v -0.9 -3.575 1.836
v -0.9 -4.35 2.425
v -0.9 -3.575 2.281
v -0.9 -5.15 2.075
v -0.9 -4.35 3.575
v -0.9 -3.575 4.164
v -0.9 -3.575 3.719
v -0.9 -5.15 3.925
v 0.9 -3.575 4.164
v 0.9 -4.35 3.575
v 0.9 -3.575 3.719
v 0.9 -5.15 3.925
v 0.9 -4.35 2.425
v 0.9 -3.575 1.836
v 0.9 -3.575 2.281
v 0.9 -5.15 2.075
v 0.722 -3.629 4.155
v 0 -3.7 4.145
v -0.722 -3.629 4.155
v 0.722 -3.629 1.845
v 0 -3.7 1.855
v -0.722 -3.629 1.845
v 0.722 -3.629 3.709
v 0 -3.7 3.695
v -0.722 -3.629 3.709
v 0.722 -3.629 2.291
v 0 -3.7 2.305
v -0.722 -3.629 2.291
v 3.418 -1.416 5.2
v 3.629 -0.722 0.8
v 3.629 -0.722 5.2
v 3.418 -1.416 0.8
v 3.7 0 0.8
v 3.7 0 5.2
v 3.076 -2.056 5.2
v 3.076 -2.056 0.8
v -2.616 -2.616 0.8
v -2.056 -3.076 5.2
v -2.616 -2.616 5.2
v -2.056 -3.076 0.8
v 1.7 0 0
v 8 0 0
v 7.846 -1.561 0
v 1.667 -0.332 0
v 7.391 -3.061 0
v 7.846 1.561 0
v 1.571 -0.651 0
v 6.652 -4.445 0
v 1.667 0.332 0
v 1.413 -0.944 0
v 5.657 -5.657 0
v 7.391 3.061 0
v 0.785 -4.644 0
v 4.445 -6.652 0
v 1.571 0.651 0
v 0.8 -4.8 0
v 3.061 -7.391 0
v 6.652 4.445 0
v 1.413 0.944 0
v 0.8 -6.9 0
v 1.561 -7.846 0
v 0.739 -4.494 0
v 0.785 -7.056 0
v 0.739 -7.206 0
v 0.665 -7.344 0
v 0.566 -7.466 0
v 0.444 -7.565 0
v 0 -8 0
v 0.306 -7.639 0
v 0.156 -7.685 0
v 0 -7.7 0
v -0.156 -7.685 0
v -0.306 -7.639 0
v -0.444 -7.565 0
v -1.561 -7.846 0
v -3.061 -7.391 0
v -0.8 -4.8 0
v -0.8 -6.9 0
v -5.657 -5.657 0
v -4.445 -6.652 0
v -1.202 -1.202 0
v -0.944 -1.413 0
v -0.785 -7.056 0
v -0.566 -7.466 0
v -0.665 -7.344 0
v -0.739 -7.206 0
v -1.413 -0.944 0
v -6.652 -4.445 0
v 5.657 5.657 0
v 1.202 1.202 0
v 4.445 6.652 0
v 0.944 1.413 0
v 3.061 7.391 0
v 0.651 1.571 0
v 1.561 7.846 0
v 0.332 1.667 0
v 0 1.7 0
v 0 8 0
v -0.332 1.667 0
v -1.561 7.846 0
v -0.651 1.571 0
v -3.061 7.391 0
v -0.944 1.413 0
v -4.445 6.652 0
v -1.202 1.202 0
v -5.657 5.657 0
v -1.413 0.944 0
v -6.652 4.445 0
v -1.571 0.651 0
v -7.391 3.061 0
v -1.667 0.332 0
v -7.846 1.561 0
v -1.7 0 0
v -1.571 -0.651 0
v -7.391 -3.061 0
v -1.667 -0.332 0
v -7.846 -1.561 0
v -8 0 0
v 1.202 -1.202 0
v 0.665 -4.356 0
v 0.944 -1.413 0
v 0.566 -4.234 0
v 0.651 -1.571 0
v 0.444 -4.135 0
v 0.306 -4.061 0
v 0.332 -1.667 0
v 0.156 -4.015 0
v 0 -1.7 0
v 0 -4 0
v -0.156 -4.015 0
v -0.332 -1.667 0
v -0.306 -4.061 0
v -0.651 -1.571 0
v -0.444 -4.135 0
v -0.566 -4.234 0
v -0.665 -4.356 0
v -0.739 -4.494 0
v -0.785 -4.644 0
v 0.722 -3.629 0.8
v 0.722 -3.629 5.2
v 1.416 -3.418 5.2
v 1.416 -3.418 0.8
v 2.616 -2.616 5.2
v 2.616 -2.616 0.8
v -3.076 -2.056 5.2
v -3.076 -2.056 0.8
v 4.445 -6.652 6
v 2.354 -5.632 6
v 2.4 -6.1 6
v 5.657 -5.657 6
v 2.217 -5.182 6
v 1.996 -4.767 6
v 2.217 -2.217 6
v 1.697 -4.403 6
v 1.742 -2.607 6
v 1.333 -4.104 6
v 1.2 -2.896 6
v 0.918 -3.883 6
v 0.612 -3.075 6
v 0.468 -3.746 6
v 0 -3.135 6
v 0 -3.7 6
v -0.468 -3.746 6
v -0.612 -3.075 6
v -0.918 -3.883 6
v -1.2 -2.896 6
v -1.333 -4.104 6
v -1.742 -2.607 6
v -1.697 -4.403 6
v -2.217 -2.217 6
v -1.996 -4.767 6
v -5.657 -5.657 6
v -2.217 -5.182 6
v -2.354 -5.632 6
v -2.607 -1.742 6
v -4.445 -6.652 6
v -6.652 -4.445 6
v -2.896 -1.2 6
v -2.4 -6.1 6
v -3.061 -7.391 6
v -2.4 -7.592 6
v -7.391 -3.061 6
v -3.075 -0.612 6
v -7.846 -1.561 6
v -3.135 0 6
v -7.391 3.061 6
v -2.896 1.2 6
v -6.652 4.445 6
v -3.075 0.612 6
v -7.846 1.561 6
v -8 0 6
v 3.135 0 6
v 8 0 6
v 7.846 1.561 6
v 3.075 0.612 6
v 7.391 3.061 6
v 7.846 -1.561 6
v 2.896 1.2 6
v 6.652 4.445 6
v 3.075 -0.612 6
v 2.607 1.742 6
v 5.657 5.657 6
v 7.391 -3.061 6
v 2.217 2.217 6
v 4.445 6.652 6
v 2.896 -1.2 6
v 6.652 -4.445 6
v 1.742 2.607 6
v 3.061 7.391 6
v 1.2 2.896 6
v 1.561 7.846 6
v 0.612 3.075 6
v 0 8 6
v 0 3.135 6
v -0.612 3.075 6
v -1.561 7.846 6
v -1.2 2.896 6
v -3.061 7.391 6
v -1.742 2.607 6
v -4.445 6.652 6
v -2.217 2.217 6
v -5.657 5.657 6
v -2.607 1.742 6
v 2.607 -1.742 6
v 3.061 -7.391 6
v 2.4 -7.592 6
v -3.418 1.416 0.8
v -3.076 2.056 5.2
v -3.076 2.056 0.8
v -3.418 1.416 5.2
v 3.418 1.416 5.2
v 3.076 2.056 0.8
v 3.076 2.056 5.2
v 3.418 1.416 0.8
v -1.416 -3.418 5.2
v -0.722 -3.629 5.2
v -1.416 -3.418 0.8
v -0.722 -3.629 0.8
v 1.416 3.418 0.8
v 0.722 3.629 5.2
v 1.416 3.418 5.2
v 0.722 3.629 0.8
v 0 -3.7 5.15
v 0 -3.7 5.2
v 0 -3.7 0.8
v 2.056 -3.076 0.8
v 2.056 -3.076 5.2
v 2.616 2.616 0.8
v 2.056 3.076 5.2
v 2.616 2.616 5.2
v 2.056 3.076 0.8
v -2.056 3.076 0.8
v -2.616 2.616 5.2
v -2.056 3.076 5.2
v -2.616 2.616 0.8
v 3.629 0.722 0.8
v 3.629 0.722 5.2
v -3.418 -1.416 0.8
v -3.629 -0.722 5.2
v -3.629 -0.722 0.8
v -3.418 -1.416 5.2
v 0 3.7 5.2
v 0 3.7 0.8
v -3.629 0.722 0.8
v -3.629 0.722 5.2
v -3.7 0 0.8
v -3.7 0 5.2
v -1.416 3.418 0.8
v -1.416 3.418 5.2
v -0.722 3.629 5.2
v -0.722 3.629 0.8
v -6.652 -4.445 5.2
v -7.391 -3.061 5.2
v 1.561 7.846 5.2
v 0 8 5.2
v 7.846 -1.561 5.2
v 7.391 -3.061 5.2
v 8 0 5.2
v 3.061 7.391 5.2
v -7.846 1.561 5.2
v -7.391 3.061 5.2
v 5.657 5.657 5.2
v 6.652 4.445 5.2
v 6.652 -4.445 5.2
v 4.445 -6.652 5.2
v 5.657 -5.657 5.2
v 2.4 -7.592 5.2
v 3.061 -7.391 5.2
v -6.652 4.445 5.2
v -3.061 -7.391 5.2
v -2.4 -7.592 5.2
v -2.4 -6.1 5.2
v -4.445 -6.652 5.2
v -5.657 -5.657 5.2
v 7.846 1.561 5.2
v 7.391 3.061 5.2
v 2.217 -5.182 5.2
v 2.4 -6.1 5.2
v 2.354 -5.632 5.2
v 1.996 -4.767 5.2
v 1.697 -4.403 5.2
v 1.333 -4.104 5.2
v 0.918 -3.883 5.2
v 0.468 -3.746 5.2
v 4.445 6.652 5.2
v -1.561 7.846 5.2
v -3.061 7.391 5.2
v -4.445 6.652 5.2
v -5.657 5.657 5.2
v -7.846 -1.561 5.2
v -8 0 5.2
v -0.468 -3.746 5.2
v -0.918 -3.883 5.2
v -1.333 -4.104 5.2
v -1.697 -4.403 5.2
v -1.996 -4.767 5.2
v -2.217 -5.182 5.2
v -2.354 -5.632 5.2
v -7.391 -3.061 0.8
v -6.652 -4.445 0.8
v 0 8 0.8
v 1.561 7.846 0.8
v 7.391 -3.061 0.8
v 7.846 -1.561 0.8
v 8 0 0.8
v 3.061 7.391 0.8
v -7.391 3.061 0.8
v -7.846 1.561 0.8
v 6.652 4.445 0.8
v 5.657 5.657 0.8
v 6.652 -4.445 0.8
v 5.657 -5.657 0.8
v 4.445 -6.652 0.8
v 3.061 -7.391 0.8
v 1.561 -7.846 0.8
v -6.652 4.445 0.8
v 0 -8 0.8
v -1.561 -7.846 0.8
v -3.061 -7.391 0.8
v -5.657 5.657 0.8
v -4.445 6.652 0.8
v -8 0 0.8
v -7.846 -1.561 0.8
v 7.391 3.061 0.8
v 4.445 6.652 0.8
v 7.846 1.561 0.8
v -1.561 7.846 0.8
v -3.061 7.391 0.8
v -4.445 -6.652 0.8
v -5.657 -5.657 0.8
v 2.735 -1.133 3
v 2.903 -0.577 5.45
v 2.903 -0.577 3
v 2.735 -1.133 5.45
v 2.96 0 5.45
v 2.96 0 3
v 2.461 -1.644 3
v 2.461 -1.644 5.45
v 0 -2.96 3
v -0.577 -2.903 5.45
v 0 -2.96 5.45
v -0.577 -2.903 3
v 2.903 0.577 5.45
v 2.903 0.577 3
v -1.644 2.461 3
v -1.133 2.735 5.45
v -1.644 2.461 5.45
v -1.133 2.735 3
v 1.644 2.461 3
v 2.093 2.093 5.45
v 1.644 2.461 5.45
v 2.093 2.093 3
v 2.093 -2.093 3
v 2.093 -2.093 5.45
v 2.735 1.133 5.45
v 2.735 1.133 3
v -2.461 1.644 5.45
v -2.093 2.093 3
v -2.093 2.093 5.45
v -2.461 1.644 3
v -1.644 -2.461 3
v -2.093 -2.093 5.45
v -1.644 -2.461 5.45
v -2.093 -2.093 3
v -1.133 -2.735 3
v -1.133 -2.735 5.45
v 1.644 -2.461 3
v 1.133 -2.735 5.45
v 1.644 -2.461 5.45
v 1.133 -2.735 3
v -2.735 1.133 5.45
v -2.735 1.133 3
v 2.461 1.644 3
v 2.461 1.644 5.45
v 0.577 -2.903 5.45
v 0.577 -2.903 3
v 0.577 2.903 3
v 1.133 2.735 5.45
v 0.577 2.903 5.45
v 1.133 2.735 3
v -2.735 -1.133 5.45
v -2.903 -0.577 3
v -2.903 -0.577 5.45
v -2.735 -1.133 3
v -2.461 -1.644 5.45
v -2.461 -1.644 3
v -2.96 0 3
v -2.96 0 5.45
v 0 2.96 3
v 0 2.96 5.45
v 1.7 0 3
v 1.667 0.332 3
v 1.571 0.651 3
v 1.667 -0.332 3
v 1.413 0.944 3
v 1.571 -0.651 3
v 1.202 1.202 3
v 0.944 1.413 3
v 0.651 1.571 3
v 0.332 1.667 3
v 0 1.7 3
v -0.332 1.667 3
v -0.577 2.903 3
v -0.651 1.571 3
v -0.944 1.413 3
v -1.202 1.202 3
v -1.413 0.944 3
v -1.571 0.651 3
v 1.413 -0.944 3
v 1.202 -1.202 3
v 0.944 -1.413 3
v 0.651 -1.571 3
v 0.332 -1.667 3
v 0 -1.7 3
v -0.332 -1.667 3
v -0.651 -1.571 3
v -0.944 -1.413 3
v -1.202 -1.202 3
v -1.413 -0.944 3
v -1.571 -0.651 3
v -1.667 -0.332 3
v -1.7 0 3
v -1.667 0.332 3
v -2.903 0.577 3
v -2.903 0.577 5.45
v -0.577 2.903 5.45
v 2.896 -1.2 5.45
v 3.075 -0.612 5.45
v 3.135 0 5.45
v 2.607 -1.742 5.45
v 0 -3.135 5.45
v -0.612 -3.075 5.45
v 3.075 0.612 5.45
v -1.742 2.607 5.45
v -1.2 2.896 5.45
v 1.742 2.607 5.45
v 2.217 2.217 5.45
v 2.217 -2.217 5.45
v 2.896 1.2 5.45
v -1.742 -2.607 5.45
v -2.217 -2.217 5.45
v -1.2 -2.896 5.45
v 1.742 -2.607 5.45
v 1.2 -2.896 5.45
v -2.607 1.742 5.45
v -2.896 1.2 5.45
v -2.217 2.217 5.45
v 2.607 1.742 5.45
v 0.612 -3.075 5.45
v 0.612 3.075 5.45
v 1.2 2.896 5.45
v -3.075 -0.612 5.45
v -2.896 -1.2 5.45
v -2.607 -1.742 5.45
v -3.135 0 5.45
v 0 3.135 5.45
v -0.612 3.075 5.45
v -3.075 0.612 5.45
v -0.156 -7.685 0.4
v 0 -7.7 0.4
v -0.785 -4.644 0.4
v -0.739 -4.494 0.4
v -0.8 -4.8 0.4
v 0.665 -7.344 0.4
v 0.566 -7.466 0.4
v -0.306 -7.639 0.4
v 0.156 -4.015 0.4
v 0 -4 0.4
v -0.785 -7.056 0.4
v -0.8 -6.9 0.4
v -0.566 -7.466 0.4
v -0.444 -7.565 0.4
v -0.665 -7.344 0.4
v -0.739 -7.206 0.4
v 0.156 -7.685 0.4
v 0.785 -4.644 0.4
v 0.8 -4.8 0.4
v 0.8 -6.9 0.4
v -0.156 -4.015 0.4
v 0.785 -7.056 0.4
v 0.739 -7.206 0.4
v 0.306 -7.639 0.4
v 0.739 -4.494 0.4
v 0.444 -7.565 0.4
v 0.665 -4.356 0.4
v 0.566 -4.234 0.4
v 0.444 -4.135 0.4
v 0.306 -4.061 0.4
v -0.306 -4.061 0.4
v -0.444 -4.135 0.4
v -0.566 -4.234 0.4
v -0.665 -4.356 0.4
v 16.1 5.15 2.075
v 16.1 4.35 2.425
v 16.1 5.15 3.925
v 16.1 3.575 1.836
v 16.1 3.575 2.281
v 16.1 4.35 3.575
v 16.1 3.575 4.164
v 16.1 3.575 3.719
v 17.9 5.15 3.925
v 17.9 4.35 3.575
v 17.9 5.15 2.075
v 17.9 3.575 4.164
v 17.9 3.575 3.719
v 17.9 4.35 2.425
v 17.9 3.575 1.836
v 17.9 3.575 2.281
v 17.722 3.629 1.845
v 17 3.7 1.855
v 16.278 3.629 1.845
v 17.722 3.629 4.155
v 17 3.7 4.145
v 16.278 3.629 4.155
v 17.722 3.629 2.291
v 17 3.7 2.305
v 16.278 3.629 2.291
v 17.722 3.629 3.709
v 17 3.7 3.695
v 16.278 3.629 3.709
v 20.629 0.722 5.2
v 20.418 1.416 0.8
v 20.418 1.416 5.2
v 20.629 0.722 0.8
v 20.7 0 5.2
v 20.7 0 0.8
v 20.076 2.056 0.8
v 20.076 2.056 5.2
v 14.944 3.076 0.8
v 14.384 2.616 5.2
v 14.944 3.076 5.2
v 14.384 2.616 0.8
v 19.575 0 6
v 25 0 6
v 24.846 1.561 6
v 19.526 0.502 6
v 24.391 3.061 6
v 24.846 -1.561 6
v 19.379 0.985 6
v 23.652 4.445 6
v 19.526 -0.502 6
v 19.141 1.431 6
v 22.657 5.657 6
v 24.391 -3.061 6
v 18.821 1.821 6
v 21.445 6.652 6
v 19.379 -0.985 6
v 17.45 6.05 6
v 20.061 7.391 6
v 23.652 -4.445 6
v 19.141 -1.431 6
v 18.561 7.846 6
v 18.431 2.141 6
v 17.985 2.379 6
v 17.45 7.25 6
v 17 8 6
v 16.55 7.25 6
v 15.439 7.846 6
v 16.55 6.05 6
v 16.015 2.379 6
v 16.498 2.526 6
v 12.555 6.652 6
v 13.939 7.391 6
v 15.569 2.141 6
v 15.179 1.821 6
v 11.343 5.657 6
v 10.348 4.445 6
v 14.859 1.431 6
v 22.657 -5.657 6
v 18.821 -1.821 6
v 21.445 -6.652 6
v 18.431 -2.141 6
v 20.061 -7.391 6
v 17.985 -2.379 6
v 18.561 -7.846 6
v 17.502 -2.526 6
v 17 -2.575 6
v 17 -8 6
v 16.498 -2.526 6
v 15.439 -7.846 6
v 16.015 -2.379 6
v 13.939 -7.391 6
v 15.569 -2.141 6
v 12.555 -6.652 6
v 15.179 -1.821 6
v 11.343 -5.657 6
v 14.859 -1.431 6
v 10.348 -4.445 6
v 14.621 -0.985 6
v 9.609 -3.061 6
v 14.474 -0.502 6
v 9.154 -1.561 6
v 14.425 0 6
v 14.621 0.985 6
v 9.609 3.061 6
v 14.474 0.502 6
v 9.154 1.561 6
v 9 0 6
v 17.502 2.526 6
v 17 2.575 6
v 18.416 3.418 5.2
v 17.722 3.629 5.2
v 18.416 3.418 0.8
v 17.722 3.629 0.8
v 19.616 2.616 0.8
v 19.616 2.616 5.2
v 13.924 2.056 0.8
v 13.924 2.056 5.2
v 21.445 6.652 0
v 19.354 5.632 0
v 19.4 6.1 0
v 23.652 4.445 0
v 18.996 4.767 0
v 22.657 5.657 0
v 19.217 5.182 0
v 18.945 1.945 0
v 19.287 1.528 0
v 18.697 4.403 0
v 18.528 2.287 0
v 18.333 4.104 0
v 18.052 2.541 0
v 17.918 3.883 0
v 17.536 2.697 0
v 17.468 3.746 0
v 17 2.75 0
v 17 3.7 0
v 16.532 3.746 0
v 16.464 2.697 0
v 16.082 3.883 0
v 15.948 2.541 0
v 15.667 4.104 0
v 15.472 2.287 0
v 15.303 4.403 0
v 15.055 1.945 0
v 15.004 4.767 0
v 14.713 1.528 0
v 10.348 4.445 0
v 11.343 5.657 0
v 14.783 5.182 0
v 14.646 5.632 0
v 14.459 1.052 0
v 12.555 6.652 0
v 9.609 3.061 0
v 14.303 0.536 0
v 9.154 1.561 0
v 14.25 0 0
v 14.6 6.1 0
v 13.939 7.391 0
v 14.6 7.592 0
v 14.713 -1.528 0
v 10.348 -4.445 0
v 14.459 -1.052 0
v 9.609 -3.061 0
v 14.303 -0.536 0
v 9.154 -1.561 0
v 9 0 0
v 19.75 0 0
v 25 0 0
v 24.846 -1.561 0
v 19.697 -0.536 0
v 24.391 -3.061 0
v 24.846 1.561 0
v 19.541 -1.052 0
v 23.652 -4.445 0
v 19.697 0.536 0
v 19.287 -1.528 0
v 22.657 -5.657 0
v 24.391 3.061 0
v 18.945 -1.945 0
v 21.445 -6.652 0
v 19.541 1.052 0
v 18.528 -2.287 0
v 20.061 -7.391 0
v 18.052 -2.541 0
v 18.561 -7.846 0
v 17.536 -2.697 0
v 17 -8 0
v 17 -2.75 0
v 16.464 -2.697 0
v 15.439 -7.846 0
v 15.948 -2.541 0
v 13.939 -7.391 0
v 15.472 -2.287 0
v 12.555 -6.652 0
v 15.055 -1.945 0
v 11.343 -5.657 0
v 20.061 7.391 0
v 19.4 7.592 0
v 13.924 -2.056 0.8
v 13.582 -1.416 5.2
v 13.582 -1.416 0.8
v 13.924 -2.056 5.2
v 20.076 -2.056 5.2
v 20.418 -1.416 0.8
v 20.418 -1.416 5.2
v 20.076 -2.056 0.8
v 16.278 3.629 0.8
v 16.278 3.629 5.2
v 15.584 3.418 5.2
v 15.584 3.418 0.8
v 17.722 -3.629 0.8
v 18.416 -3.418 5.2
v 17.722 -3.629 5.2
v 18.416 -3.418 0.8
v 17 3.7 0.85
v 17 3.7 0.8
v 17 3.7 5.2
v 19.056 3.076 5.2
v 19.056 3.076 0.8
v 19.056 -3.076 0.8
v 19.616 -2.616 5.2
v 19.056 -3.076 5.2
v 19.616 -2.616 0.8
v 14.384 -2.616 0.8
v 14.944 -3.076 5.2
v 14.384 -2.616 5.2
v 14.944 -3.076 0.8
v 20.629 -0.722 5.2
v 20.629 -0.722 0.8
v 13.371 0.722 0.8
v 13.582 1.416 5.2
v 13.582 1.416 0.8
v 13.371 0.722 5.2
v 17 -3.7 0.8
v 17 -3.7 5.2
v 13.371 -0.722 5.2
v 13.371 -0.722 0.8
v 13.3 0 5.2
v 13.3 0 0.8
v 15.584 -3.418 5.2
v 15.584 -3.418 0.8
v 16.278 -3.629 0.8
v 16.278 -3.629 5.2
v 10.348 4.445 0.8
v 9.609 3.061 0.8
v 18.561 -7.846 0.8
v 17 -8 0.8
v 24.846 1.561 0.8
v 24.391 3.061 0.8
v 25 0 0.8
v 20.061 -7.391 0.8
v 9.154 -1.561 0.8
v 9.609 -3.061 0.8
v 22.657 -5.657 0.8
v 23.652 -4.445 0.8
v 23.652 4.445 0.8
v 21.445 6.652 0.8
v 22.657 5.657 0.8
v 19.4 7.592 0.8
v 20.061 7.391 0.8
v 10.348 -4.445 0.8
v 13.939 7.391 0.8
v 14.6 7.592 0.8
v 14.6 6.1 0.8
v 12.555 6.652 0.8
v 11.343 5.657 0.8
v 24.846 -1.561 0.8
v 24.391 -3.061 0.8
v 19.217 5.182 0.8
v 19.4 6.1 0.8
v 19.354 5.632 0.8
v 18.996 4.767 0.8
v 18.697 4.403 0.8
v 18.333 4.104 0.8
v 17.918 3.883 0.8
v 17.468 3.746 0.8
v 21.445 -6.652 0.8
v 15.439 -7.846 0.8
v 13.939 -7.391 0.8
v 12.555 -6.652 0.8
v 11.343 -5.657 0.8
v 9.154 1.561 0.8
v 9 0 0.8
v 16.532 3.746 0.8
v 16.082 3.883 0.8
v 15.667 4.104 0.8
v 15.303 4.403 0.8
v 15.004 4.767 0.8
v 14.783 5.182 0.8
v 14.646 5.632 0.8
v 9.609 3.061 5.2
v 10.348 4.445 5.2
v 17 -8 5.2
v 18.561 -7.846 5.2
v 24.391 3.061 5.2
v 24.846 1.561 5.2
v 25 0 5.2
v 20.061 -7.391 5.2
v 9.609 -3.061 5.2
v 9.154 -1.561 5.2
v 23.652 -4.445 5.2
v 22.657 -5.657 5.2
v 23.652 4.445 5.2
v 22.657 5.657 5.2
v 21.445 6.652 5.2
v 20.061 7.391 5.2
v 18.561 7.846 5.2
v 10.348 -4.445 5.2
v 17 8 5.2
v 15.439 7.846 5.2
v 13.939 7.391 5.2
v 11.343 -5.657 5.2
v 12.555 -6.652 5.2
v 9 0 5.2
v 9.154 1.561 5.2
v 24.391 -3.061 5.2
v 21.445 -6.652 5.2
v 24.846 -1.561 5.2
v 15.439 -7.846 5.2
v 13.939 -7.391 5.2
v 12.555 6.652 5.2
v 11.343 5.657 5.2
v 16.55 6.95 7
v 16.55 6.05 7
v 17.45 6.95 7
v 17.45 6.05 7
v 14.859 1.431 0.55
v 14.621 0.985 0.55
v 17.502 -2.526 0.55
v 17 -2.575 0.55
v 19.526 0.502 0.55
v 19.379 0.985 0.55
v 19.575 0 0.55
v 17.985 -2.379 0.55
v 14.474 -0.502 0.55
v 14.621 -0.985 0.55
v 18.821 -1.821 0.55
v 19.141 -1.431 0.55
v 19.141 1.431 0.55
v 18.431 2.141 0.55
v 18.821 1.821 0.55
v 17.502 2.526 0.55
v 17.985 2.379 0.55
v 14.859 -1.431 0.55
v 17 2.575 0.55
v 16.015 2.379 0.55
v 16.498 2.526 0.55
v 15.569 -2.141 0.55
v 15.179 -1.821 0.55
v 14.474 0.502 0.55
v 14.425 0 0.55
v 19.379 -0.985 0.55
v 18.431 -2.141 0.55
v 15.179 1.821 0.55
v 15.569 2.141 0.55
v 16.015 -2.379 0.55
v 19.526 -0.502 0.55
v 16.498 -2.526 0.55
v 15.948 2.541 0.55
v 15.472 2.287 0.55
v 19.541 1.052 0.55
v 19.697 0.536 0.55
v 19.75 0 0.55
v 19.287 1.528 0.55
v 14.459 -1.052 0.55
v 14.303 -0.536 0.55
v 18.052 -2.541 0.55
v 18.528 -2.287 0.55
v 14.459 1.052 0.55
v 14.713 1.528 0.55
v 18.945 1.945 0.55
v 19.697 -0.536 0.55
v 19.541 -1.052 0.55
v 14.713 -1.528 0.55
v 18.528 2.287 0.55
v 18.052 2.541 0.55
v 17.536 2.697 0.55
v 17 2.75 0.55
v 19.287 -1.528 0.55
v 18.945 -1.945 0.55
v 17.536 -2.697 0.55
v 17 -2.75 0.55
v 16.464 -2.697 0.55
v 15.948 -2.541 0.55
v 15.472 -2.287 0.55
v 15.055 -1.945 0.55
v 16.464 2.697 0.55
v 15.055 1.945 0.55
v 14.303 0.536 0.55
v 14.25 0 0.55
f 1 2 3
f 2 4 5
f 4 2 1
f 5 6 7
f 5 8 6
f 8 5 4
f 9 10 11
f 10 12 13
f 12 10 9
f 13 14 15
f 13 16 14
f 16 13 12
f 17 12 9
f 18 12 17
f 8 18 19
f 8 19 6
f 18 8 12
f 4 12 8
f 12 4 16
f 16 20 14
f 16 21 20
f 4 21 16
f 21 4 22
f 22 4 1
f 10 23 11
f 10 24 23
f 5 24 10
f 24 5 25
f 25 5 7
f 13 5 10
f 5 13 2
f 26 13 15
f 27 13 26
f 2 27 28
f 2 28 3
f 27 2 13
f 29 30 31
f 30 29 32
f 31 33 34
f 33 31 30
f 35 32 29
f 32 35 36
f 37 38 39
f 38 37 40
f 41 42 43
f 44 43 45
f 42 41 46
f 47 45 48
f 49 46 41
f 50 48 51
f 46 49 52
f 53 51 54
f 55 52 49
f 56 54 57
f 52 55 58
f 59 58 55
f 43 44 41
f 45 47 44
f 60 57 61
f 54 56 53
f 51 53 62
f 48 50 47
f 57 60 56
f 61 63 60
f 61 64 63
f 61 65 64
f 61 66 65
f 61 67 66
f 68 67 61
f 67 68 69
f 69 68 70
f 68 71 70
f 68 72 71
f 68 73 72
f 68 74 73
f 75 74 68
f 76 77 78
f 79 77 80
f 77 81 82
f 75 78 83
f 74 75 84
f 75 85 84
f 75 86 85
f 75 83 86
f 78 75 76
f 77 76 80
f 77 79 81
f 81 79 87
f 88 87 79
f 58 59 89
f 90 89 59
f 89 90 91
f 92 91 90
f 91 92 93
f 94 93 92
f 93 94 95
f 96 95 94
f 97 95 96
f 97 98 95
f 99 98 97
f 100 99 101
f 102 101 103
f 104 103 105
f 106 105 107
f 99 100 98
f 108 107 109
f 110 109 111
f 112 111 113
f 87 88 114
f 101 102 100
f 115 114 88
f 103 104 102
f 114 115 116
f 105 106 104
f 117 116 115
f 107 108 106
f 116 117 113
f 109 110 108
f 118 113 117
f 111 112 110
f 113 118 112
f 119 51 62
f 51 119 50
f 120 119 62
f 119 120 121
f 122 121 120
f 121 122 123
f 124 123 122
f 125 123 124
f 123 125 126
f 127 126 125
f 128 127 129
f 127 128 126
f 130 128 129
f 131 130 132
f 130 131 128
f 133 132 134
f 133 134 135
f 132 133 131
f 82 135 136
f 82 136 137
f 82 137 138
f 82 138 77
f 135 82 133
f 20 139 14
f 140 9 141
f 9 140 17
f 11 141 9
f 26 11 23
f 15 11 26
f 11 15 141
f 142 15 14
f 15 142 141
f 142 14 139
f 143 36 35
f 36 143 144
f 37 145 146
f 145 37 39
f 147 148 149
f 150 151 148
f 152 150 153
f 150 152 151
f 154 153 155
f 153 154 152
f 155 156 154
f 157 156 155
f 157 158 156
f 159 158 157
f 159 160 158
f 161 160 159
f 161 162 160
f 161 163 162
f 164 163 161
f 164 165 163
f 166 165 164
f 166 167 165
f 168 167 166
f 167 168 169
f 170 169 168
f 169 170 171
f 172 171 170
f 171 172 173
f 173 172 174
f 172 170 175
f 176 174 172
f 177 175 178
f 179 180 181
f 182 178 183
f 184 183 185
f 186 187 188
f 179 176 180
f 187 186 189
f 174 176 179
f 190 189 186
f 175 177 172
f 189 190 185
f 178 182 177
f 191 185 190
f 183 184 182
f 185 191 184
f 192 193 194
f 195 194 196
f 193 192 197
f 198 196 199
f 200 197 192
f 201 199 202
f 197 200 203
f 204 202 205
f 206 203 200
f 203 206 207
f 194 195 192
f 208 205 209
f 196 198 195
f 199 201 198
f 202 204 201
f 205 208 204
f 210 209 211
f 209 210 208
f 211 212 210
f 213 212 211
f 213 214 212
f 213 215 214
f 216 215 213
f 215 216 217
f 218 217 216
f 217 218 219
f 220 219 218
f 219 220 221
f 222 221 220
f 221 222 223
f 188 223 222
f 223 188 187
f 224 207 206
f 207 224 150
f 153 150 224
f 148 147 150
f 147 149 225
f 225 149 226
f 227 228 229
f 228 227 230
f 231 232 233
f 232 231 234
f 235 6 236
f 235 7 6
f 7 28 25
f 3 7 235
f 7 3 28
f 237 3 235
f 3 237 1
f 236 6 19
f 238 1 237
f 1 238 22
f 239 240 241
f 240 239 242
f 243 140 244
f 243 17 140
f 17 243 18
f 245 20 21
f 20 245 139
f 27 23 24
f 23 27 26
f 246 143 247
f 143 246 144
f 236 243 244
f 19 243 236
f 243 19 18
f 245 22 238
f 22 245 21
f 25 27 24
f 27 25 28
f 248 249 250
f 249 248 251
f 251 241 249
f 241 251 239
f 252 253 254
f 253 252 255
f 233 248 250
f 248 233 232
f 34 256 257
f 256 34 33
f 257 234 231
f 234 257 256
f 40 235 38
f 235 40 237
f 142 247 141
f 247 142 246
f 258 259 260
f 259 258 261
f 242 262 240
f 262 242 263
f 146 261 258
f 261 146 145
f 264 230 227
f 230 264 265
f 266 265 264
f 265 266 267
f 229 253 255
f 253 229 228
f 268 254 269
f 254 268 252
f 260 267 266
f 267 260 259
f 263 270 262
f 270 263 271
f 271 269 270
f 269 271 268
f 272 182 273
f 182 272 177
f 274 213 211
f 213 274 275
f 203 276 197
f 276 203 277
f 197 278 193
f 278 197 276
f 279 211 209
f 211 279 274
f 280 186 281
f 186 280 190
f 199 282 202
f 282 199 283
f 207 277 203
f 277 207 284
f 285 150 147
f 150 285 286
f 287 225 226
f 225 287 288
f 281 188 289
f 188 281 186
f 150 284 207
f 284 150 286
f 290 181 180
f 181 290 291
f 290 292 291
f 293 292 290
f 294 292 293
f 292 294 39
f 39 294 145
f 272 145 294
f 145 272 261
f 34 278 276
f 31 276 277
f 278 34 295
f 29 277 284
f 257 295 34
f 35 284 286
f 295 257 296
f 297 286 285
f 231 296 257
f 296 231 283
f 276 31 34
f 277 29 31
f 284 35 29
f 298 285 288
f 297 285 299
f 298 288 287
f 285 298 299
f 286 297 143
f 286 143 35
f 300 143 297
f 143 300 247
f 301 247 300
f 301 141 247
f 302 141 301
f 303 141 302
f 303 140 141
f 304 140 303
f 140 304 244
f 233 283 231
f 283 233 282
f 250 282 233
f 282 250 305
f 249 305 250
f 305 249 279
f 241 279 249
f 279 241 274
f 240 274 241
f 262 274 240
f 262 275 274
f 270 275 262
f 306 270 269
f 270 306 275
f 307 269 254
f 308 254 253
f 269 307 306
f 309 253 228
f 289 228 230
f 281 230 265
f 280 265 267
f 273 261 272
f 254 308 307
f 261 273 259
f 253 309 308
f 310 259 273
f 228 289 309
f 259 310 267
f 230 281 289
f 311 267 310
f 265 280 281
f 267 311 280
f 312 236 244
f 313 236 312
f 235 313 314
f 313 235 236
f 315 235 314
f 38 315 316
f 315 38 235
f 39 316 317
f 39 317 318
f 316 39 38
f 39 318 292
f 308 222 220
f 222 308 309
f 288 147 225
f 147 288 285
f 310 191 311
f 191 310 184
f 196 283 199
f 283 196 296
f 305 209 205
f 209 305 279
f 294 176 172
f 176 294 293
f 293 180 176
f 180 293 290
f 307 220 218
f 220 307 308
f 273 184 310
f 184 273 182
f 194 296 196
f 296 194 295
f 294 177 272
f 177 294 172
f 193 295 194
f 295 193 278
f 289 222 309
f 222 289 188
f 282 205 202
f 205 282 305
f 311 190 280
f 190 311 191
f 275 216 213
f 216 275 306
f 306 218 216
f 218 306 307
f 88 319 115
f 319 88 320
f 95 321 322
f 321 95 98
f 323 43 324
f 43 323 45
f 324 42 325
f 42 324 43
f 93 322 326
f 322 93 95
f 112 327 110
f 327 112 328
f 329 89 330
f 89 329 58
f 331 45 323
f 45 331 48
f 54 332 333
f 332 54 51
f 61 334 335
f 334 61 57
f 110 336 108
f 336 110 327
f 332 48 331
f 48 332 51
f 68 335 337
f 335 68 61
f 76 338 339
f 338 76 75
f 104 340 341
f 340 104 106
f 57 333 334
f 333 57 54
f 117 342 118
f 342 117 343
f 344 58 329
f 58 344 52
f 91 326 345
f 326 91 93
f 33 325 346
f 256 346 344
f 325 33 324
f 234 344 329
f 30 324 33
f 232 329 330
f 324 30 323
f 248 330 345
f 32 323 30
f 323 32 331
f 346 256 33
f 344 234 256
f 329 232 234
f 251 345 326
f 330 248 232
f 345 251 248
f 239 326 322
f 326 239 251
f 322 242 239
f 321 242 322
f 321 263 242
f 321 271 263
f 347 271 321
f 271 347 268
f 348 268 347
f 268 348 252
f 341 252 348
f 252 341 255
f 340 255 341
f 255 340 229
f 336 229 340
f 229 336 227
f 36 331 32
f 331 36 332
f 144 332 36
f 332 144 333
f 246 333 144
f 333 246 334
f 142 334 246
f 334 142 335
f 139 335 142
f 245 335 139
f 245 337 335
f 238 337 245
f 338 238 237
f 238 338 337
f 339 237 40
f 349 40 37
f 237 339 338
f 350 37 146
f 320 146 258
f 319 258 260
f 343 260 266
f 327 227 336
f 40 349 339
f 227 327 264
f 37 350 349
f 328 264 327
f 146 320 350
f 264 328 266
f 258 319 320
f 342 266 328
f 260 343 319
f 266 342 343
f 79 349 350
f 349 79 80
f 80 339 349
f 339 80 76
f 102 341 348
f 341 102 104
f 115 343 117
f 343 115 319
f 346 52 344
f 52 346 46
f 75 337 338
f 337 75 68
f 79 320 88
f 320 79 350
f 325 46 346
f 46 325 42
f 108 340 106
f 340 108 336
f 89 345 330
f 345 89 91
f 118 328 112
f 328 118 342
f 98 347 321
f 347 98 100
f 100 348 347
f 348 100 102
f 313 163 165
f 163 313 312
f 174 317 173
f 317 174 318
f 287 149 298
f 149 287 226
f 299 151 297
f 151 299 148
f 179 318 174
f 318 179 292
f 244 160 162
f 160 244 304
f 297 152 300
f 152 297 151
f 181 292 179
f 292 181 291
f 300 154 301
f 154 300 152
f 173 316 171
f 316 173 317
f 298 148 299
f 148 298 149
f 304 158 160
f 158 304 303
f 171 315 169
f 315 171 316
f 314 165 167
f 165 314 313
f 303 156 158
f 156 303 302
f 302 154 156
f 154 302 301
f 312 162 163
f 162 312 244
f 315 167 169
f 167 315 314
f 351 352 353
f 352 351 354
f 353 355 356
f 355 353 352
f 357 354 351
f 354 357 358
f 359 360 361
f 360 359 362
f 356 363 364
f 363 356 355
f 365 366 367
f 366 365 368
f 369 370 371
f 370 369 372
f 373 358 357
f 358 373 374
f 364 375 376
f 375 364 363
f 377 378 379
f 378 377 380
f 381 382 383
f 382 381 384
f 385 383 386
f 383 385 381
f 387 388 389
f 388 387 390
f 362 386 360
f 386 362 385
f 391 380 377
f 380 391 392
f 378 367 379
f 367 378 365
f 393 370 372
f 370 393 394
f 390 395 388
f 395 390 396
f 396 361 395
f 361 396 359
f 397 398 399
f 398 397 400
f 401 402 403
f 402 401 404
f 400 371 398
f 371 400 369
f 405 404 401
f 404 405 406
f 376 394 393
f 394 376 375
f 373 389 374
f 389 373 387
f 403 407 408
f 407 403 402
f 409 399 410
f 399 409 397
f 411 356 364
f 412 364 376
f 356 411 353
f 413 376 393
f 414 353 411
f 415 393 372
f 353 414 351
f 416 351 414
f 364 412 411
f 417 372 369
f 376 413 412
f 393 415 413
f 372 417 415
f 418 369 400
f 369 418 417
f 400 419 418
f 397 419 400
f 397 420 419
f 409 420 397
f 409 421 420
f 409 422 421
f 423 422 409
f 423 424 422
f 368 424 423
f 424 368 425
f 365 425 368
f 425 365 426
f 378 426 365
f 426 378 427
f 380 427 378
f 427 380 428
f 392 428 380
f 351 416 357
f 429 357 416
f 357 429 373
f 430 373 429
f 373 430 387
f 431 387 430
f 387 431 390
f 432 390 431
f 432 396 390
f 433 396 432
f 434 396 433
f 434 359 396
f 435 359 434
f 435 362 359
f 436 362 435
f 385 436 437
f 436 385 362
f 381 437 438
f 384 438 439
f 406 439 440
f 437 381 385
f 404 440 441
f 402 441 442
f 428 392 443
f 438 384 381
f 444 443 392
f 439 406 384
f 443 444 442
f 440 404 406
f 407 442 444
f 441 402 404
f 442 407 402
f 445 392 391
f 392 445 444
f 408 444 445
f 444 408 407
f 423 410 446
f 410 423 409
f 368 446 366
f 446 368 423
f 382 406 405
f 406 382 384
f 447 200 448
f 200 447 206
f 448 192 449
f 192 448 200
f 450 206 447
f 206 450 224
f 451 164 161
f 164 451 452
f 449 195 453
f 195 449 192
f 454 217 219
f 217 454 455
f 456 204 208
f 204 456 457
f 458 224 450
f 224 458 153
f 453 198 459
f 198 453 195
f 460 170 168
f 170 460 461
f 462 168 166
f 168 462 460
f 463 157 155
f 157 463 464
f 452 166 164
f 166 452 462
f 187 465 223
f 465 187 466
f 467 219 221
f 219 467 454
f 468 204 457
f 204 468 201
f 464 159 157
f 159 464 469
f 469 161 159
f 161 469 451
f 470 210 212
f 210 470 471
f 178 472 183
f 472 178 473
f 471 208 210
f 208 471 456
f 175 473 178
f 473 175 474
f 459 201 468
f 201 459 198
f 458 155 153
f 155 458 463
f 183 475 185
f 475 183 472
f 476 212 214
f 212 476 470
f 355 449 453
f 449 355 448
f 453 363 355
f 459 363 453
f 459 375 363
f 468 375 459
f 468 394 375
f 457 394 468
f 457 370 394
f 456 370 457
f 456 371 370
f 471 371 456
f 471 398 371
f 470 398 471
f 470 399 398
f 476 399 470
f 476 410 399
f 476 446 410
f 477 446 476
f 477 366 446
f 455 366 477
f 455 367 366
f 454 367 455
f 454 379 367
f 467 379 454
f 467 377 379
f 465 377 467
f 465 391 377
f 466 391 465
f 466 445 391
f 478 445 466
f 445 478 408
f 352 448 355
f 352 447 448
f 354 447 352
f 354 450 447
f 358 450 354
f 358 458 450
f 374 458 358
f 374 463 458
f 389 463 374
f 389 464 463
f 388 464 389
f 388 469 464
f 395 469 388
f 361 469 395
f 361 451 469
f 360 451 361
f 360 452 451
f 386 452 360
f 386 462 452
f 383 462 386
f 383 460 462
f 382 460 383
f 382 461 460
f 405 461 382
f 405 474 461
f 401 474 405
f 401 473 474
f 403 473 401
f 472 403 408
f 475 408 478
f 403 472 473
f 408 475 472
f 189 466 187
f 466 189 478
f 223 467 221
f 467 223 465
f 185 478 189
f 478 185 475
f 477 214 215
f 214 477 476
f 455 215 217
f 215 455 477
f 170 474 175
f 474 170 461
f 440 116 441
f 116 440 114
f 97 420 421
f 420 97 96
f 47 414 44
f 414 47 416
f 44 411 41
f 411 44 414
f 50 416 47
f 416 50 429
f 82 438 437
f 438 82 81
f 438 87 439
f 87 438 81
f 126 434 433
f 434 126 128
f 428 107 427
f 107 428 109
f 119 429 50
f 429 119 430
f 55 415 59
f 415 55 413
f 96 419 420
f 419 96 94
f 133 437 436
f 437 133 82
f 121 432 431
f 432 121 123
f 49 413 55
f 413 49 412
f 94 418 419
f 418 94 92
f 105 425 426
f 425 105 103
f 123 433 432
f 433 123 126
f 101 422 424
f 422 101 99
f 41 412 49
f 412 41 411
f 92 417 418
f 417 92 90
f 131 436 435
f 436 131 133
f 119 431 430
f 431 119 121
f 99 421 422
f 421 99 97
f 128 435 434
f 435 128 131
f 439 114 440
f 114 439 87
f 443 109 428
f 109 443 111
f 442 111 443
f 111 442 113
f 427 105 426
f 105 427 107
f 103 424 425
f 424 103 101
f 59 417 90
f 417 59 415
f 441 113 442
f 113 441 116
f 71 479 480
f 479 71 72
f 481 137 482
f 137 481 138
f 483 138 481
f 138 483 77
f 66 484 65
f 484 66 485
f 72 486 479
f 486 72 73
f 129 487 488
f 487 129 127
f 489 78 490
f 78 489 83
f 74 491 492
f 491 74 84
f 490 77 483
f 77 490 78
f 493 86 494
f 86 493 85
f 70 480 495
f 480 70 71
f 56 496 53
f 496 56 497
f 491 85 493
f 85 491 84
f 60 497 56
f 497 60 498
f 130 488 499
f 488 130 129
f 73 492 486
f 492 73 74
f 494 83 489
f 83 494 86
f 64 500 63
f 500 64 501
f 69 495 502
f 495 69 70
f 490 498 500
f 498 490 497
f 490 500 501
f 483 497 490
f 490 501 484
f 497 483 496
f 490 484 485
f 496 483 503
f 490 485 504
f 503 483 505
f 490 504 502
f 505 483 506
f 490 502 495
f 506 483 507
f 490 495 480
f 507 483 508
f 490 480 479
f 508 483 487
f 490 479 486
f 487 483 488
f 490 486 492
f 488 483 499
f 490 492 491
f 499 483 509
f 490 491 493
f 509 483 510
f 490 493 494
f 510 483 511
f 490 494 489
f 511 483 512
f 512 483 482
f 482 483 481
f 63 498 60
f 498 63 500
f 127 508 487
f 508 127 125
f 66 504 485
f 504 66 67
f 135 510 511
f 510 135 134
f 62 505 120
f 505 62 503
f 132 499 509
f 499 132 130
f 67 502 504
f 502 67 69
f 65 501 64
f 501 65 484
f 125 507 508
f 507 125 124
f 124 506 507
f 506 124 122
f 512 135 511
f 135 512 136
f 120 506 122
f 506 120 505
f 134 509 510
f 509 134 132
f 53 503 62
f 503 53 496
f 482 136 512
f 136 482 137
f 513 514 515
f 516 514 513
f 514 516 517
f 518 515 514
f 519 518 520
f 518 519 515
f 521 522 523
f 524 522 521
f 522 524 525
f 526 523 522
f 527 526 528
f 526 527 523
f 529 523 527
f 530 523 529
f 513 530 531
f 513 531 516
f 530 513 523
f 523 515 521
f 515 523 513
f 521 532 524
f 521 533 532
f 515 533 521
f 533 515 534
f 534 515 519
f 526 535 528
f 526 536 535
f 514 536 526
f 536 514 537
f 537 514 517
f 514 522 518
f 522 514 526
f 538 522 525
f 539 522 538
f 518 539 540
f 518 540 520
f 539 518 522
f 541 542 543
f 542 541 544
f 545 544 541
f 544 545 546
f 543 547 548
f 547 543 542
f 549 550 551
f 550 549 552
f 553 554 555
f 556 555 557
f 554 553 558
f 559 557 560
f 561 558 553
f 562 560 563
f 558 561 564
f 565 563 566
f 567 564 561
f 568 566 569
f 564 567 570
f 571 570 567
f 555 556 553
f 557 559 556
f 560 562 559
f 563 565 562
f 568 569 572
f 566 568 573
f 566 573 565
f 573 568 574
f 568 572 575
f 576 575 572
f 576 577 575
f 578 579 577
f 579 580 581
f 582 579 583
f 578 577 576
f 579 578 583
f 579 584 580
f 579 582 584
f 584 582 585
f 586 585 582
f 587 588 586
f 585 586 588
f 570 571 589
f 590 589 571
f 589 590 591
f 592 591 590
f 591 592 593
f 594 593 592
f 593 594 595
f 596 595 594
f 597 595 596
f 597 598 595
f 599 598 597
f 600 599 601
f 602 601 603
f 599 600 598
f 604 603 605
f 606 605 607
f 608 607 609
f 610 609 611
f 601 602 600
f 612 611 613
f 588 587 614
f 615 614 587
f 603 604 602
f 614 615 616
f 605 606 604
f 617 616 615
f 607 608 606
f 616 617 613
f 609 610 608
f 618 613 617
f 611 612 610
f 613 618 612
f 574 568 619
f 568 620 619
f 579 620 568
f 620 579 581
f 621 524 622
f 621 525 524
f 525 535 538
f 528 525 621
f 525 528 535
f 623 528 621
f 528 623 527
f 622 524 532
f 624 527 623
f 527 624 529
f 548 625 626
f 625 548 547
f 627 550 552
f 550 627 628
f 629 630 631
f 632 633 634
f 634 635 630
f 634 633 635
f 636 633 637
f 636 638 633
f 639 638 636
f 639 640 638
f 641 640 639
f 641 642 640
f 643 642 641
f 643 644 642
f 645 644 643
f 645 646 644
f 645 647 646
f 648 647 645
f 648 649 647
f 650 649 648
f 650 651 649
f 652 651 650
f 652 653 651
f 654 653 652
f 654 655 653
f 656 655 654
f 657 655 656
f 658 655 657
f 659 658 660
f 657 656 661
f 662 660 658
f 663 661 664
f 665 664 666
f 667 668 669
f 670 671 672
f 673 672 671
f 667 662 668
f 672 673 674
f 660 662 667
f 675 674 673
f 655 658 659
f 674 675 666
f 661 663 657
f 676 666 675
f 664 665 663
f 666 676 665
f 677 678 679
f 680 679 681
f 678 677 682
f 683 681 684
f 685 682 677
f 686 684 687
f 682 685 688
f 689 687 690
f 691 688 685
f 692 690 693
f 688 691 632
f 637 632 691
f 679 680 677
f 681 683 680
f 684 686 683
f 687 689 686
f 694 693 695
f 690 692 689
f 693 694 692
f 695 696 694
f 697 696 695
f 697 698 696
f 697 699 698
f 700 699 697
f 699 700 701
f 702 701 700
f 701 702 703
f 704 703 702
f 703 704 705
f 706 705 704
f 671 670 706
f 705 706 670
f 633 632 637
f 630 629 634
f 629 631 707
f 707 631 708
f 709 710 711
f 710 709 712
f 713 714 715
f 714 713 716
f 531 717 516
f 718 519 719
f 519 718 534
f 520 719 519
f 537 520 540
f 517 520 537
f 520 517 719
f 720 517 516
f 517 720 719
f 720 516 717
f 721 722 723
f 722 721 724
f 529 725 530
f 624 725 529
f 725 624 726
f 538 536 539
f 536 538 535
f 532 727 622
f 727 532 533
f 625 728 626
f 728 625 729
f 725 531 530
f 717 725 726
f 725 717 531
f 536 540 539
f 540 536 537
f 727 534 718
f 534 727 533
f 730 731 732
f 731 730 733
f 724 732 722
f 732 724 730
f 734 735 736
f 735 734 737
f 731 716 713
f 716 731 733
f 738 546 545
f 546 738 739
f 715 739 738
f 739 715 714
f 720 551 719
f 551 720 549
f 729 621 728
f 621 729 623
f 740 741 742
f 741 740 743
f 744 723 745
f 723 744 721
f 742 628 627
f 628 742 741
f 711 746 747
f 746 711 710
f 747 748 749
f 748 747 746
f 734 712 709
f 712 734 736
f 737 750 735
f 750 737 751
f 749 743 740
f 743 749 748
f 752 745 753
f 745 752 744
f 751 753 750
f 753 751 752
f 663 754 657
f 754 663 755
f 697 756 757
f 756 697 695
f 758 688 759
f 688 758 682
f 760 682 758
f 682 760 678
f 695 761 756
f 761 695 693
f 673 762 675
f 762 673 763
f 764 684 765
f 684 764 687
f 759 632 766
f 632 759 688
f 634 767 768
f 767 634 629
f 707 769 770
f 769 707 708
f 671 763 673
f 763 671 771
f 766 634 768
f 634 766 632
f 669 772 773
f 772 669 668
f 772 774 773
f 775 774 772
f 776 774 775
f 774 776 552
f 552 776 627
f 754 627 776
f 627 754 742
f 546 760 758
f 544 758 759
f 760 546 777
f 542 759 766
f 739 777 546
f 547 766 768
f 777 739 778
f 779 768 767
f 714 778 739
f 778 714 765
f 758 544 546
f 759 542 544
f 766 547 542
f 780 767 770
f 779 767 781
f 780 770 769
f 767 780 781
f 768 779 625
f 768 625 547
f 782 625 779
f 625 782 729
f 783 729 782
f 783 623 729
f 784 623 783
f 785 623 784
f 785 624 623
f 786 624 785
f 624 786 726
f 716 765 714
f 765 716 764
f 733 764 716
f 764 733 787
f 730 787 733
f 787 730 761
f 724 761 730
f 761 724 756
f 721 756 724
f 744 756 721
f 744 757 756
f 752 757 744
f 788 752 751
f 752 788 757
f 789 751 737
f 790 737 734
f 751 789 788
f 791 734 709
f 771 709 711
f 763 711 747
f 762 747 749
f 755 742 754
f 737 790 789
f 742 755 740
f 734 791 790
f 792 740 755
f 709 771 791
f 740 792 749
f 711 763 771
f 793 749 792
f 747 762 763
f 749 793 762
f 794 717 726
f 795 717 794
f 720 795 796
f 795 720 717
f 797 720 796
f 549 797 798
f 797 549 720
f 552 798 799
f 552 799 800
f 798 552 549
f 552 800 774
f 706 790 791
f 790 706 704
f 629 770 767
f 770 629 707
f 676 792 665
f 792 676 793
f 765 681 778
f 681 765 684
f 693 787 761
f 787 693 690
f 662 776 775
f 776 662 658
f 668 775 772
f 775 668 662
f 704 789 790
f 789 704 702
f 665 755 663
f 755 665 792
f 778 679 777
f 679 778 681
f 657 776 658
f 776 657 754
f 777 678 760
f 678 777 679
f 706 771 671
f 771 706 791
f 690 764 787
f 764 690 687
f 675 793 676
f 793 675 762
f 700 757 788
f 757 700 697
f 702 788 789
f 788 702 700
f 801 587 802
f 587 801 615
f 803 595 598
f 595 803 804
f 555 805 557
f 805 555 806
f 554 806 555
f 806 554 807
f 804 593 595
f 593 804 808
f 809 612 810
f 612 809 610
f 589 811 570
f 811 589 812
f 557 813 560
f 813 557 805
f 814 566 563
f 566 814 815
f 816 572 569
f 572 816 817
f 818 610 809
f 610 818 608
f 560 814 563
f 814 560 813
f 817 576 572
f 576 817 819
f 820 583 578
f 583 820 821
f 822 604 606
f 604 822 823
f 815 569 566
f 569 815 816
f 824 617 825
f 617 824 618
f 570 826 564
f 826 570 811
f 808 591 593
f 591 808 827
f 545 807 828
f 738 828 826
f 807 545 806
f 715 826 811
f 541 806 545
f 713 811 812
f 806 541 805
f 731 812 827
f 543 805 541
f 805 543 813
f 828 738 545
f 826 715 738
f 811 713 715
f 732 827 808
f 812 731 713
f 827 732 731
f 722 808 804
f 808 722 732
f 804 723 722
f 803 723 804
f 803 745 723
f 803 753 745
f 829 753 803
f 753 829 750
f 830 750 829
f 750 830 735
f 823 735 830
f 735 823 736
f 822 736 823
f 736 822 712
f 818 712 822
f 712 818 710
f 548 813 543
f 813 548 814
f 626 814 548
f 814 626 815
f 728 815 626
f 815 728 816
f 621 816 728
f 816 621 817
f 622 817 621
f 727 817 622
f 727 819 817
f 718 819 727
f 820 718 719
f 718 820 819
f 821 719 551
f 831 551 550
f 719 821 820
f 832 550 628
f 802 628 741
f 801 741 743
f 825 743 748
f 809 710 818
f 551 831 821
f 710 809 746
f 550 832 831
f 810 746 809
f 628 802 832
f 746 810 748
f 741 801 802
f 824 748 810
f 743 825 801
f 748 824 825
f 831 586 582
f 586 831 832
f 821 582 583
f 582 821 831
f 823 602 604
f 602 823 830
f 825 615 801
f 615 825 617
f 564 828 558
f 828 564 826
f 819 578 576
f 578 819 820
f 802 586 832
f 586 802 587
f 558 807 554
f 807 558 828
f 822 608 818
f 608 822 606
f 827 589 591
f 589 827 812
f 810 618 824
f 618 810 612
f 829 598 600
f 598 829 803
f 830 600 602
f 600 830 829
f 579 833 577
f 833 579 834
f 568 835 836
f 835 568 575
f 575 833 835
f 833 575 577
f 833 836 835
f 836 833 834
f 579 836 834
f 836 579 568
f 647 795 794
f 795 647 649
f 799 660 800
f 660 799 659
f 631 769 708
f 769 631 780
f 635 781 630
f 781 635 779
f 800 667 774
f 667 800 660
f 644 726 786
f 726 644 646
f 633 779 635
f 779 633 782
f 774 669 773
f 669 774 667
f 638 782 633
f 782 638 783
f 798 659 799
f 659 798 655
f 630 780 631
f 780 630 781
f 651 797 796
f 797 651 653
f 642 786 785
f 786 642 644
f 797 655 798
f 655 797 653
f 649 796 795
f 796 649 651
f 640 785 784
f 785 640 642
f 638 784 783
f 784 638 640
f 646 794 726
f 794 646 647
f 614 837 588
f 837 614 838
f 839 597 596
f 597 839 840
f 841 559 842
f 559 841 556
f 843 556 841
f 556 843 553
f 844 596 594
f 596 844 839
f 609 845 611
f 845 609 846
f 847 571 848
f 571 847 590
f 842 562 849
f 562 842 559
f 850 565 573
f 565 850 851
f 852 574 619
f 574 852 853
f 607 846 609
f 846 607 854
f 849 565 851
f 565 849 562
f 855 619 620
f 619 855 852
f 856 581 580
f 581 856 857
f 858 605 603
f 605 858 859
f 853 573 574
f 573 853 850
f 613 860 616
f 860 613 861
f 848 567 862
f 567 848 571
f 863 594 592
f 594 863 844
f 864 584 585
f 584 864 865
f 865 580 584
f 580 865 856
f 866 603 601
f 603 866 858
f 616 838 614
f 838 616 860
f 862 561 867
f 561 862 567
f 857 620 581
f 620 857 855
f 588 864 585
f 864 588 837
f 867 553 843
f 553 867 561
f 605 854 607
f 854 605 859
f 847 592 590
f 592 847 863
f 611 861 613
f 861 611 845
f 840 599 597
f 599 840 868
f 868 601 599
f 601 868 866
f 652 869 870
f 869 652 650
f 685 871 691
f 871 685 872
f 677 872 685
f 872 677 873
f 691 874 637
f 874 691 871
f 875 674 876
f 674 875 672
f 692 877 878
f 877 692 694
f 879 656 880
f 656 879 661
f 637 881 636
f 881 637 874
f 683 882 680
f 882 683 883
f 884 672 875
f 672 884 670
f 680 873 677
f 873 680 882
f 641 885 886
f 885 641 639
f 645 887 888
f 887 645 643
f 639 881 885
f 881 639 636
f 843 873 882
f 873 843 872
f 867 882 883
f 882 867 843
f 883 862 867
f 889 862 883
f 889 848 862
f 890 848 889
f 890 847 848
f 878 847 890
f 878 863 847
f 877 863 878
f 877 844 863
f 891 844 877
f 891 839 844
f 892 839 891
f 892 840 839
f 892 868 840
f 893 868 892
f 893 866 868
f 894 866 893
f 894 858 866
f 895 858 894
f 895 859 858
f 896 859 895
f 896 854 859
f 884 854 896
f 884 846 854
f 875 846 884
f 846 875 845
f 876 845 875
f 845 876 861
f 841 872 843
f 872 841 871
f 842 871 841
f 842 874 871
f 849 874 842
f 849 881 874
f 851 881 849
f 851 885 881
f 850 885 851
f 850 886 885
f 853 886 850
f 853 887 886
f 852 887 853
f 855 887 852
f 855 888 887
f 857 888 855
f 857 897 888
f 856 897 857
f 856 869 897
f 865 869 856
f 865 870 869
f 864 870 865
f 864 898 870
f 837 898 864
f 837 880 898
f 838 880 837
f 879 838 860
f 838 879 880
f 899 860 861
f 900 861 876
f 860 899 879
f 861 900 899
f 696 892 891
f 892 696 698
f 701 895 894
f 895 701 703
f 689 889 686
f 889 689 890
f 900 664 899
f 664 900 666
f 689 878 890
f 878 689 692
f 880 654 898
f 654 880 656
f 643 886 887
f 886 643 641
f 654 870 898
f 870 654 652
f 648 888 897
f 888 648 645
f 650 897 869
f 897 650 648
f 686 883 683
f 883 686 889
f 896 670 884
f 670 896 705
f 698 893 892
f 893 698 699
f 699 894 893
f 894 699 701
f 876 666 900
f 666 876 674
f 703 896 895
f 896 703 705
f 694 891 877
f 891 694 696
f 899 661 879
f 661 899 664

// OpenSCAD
// DOUBLE TAKE FRAMES DESIGN RELEASE
// DTF_RELEASE: 2.0.3
// Released: 2026-09-04
// Versioning: Semantic Versioning 2.0.0 (https://semver.org/)
// Status: CANONICAL
// Changes in 2.0.3:
// - Carried forward unchanged for the corrected prepared-project packaging.
// Changes in 2.0.2:
// - Carried forward unchanged for the native 3MF packaging hotfix.
// Changes in 2.0.1:
// - Carried forward unchanged for the prepared-project packaging correction.
// Changes in 2.0.0:
// - Uses captive 16 mm flanges coordinated with the revised clock-string guide.
// - Adds keyed bottom-flange loading slots and revised string anchors.
// Full release notes: https://doubletakeframes.com/build/#design-release
//
// Canonical captive-flange capstans.
//
// The capstans use 16 mm flanges. The hour horn is moved outward to suit that
// flange, and the upside-down minute capstan uses a recessed orientation mark.
// Canonical bores, drum geometry, heights, and the eyelet's 9 mm datum remain.

$fn = 32;
eps = 0.05;

// Selected fits retained from canonical. These modeled bores deliberately
// differ from the supplied movement-member ODs: 3.17 mm inner and 5.05 mm
// middle. They are fit dimensions, not transcriptions of movement specs.
minute_bore_d = is_undef(shared_minute_capstan_bore_d)
    ? 3.40 : shared_minute_capstan_bore_d;
hour_bores = [5.15];
minute_lower_clearance_d = 5.92;
minute_lower_clearance_h = 3.0; // Preserve canonical transition datum.

// Main geometry. The added height moves only the upper flange; established
// lower seating, anchor, and minute-bore-transition datums remain unchanged.
canonical_total_h = 5.0;
total_h = is_undef(shared_capstan_total_h)
    ? 6.0 : shared_capstan_total_h;
flange_h = 0.80;
drum_d = 7.4; // Printed winding-drum OD; unrelated to movement sleeve specs.
flange_d = is_undef(shared_capstan_flange_d)
    ? 16.0 : shared_capstan_flange_d; // MOCKUP: canonical is 9.0
eyelet_reference_flange_d = 9.0; // Keep canonical eyelet outer position.
bore_mouth_extra = 0.35;
bore_mouth_h = 0.55;
part_spacing_x = flange_d+1;     // Preserve 1 mm between enlarged parts.

// Bottom-flange installation key. It shares the fixed beak/string-anchor
// radial datum (+Y) and cannot accept the beak when the capstan is upside down.
bottom_insertion_notch_enabled = is_undef(shared_bottom_insertion_notch_enabled)
    ? true : shared_bottom_insertion_notch_enabled;
bottom_insertion_notch_clearance_per_side =
    is_undef(shared_beak_notch_clearance_per_side)
        ? 0.40 : shared_beak_notch_clearance_per_side;
bottom_insertion_notch_w_x =
    (is_undef(shared_beak_tangential_w) ? 4.0 : shared_beak_tangential_w)
    + 2*bottom_insertion_notch_clearance_per_side;

// ---------- sacrificial print supports ----------

breakaway_supports_enabled = false;
breakaway_support_count = 6;
breakaway_post_radius = 7.3;
breakaway_body_d = 1.2;
breakaway_neck_d = 0.65;
breakaway_neck_h = 0.30;

// Existing external string anchor retained unchanged.
string_eyelet_enabled = true;
string_eyelet_flange_gap_z = 0.60;
string_eyelet_w_x = 1.8;
string_eyelet_drum_overlap_y = 0.20;
string_eyelet_beyond_flange_y = is_undef(shared_string_eyelet_beyond_flange_y)
    ? 0.65 : shared_string_eyelet_beyond_flange_y;
string_eyelet_inner_face_h_z = 2.35;
string_eyelet_outer_face_h_z = 1.85;
string_eyelet_wall_z = 0.35;
string_eyelet_outer_wall_y = 0.8;    // Retain canonical hook-tip strength.
string_eyelet_void_inset_y = 0.70;

// Hour indicator horn: canonical size shifted radially toward the 16 mm rim.
indicator_horn_enabled = true;
indicator_horn_inner_y = 6.05;
indicator_horn_outer_y = 7.25;
indicator_horn_w_x = 0.90;
indicator_horn_h_z = 1.00;
indicator_horn_taper_y = 0.30;

// Bed-facing rounded orientation mark for the upside-down minute capstan.
// It stays inside the retaining rim and does not cut through the 0.8 mm flange.
minute_mark_w_x = 1.6;
minute_mark_y0 = 4.8;
minute_mark_y1 = 6.9;
minute_mark_depth_z = 0.40;

module cyl(d, h, z=0) {
    translate([0, 0, z]) cylinder(d=d, h=h);
}

module prism_x(points_yz, w_x) {
    n = len(points_yz);
    polyhedron(
        points = concat(
            [for (p = points_yz) [-w_x/2, p[0], p[1]]],
            [for (p = points_yz) [ w_x/2, p[0], p[1]]]
        ),
        faces = concat(
            [[for (i = [n-1:-1:0]) i]],
            [[for (i = [0:n-1]) i+n]],
            [for (i = [0:n-1]) [i, (i+1)%n, ((i+1)%n)+n, i+n]]
        )
    );
}

module top_indicator_horn(enabled=indicator_horn_enabled) {
    if (enabled)
        prism_x(
            [
                [indicator_horn_inner_y, total_h],
                [indicator_horn_outer_y, total_h],
                [indicator_horn_outer_y-indicator_horn_taper_y, total_h+indicator_horn_h_z],
                [indicator_horn_inner_y, total_h+indicator_horn_h_z]
            ],
            indicator_horn_w_x
        );
}

function eyelet_channel_z0() = flange_h + string_eyelet_flange_gap_z;
function eyelet_channel_z1() = total_h - flange_h - string_eyelet_flange_gap_z;
function eyelet_mid_z() = total_h/2; // Recenter with beak in widened gap.
function eyelet_inner_y() = drum_d/2 - string_eyelet_drum_overlap_y;
function eyelet_outer_y() = eyelet_reference_flange_d/2 + string_eyelet_beyond_flange_y;
function eyelet_inner_z0() = eyelet_mid_z() - string_eyelet_inner_face_h_z/2;
function eyelet_inner_z1() = eyelet_mid_z() + string_eyelet_inner_face_h_z/2;
function eyelet_outer_z0() = eyelet_mid_z() - string_eyelet_outer_face_h_z/2;
function eyelet_outer_z1() = eyelet_mid_z() + string_eyelet_outer_face_h_z/2;
function eyelet_void_inner_y() = drum_d/2 - string_eyelet_void_inset_y;
function eyelet_void_outer_y() = eyelet_outer_y() - string_eyelet_outer_wall_y;
function eyelet_void_inner_z0() = eyelet_inner_z0() + string_eyelet_wall_z;
function eyelet_void_inner_z1() = eyelet_inner_z1() - string_eyelet_wall_z;
function eyelet_void_outer_z0() = eyelet_outer_z0() + string_eyelet_wall_z;
function eyelet_void_outer_z1() = eyelet_outer_z1() - string_eyelet_wall_z;

module flipped_trapezoid_eyelet_solid_body() {
    intersection() {
        prism_x(
            [
                [eyelet_inner_y(), eyelet_inner_z0()],
                [eyelet_outer_y(), eyelet_outer_z0()],
                [eyelet_outer_y(), eyelet_outer_z1()],
                [eyelet_inner_y(), eyelet_inner_z1()]
            ],
            string_eyelet_w_x
        );
        translate([0, 0, total_h/2])
            cube([flange_d+2, flange_d+2, eyelet_channel_z1()-eyelet_channel_z0()], center=true);
    }
}

module flipped_trapezoid_eyelet_inner_polygon_void() {
    prism_x(
        [
            [eyelet_void_inner_y(), eyelet_void_inner_z0()],
            [eyelet_void_outer_y(), eyelet_void_outer_z0()],
            [eyelet_void_outer_y(), eyelet_void_outer_z1()],
            [eyelet_void_inner_y(), eyelet_void_inner_z1()]
        ],
        string_eyelet_w_x + 2*eps
    );
}

module polygon_cut_flipped_trapezoid_eyelet() {
    difference() {
        flipped_trapezoid_eyelet_solid_body();
        flipped_trapezoid_eyelet_inner_polygon_void();
    }
}

module bottom_insertion_notch() {
    if (bottom_insertion_notch_enabled)
        translate([0, 0, -eps])
            linear_extrude(height=flange_h+2*eps)
                hull() {
                    // Rounded inner end is tangent to the drum: no drum cut.
                    translate([0, drum_d/2+bottom_insertion_notch_w_x/2])
                        circle(d=bottom_insertion_notch_w_x);
                    // Carry the slot completely through the outer flange rim.
                    translate([0, flange_d/2+bottom_insertion_notch_w_x/2])
                        circle(d=bottom_insertion_notch_w_x);
                }
}

module capstan_shell(with_indicator_horn=true) {
    difference() {
        union() {
            cyl(drum_d, total_h);
            cyl(flange_d, flange_h);
            cyl(flange_d, flange_h, total_h-flange_h);
            if (string_eyelet_enabled) polygon_cut_flipped_trapezoid_eyelet();
            top_indicator_horn(with_indicator_horn && indicator_horn_enabled);
        }
        bottom_insertion_notch();
    }
}

module minute_orientation_mark() {
    translate([0, 0, total_h-minute_mark_depth_z])
        linear_extrude(height=minute_mark_depth_z+eps)
            hull()
                for (mark_y = [minute_mark_y0, minute_mark_y1])
                    translate([0, mark_y])
                        circle(d=minute_mark_w_x);
}

module minute_capstan() {
    difference() {
        // Printed upside down; omit the horn so the lower cavity prints cleanly.
        capstan_shell(with_indicator_horn=false);
        translate([0, 0, -eps])
            cylinder(d=minute_lower_clearance_d,
                     h=minute_lower_clearance_h+eps);
        translate([0, 0, -eps])
            cylinder(d=minute_lower_clearance_d+bore_mouth_extra, h=bore_mouth_h+eps);
        translate([0, 0, minute_lower_clearance_h])
            cylinder(d=minute_bore_d,
                     h=total_h-minute_lower_clearance_h+eps);
        minute_orientation_mark();
    }
}

module hour_capstan(bore_d=5.15) {
    difference() {
        capstan_shell(with_indicator_horn=true);
        translate([0, 0, -eps])
            cylinder(d=bore_d, h=total_h+2*eps);
        translate([0, 0, -eps])
            cylinder(d=bore_d+bore_mouth_extra, h=bore_mouth_h+eps);
    }
}

module breakaway_post(angle) {
    post_xy = [
        breakaway_post_radius*cos(angle),
        breakaway_post_radius*sin(angle)
    ];
    lower_flange_z1 = flange_h;
    upper_flange_z0 = total_h-flange_h;
    body_z0 = lower_flange_z1+breakaway_neck_h;
    body_z1 = upper_flange_z0-breakaway_neck_h;

    // Bottom snip neck, short rigid body, and top snip neck. The body remains
    // at the accessible outer edge and never approaches the eyelet sweep.
    translate([post_xy[0], post_xy[1], lower_flange_z1-eps])
        cylinder(d=breakaway_neck_d, h=breakaway_neck_h+eps);
    translate([post_xy[0], post_xy[1], body_z0-eps])
        cylinder(d=breakaway_body_d, h=body_z1-body_z0+2*eps);
    translate([post_xy[0], post_xy[1], body_z1])
        cylinder(d=breakaway_neck_d, h=breakaway_neck_h+eps);
}

module breakaway_post_set() {
    if (breakaway_supports_enabled)
        for (i=[0:breakaway_support_count-1])
            breakaway_post(i*360/breakaway_support_count);
}

module minute_capstan_print_layout() {
    // Former horn face on the bed; the recessed marker becomes a bed imprint.
    translate([0, 0, total_h])
        rotate([180, 0, 0])
            minute_capstan();
    breakaway_post_set();
}

module hour_capstan_print_layout(bore_d=5.15) {
    hour_capstan(bore_d);
    breakaway_post_set();
}

// Render minute + hour, matching the canonical file's deliverable pattern.
minute_capstan_print_layout();
for (i=[0:len(hour_bores)-1])
    translate([(i+1)*part_spacing_x, 0, 0])
        hour_capstan_print_layout(hour_bores[i]);
